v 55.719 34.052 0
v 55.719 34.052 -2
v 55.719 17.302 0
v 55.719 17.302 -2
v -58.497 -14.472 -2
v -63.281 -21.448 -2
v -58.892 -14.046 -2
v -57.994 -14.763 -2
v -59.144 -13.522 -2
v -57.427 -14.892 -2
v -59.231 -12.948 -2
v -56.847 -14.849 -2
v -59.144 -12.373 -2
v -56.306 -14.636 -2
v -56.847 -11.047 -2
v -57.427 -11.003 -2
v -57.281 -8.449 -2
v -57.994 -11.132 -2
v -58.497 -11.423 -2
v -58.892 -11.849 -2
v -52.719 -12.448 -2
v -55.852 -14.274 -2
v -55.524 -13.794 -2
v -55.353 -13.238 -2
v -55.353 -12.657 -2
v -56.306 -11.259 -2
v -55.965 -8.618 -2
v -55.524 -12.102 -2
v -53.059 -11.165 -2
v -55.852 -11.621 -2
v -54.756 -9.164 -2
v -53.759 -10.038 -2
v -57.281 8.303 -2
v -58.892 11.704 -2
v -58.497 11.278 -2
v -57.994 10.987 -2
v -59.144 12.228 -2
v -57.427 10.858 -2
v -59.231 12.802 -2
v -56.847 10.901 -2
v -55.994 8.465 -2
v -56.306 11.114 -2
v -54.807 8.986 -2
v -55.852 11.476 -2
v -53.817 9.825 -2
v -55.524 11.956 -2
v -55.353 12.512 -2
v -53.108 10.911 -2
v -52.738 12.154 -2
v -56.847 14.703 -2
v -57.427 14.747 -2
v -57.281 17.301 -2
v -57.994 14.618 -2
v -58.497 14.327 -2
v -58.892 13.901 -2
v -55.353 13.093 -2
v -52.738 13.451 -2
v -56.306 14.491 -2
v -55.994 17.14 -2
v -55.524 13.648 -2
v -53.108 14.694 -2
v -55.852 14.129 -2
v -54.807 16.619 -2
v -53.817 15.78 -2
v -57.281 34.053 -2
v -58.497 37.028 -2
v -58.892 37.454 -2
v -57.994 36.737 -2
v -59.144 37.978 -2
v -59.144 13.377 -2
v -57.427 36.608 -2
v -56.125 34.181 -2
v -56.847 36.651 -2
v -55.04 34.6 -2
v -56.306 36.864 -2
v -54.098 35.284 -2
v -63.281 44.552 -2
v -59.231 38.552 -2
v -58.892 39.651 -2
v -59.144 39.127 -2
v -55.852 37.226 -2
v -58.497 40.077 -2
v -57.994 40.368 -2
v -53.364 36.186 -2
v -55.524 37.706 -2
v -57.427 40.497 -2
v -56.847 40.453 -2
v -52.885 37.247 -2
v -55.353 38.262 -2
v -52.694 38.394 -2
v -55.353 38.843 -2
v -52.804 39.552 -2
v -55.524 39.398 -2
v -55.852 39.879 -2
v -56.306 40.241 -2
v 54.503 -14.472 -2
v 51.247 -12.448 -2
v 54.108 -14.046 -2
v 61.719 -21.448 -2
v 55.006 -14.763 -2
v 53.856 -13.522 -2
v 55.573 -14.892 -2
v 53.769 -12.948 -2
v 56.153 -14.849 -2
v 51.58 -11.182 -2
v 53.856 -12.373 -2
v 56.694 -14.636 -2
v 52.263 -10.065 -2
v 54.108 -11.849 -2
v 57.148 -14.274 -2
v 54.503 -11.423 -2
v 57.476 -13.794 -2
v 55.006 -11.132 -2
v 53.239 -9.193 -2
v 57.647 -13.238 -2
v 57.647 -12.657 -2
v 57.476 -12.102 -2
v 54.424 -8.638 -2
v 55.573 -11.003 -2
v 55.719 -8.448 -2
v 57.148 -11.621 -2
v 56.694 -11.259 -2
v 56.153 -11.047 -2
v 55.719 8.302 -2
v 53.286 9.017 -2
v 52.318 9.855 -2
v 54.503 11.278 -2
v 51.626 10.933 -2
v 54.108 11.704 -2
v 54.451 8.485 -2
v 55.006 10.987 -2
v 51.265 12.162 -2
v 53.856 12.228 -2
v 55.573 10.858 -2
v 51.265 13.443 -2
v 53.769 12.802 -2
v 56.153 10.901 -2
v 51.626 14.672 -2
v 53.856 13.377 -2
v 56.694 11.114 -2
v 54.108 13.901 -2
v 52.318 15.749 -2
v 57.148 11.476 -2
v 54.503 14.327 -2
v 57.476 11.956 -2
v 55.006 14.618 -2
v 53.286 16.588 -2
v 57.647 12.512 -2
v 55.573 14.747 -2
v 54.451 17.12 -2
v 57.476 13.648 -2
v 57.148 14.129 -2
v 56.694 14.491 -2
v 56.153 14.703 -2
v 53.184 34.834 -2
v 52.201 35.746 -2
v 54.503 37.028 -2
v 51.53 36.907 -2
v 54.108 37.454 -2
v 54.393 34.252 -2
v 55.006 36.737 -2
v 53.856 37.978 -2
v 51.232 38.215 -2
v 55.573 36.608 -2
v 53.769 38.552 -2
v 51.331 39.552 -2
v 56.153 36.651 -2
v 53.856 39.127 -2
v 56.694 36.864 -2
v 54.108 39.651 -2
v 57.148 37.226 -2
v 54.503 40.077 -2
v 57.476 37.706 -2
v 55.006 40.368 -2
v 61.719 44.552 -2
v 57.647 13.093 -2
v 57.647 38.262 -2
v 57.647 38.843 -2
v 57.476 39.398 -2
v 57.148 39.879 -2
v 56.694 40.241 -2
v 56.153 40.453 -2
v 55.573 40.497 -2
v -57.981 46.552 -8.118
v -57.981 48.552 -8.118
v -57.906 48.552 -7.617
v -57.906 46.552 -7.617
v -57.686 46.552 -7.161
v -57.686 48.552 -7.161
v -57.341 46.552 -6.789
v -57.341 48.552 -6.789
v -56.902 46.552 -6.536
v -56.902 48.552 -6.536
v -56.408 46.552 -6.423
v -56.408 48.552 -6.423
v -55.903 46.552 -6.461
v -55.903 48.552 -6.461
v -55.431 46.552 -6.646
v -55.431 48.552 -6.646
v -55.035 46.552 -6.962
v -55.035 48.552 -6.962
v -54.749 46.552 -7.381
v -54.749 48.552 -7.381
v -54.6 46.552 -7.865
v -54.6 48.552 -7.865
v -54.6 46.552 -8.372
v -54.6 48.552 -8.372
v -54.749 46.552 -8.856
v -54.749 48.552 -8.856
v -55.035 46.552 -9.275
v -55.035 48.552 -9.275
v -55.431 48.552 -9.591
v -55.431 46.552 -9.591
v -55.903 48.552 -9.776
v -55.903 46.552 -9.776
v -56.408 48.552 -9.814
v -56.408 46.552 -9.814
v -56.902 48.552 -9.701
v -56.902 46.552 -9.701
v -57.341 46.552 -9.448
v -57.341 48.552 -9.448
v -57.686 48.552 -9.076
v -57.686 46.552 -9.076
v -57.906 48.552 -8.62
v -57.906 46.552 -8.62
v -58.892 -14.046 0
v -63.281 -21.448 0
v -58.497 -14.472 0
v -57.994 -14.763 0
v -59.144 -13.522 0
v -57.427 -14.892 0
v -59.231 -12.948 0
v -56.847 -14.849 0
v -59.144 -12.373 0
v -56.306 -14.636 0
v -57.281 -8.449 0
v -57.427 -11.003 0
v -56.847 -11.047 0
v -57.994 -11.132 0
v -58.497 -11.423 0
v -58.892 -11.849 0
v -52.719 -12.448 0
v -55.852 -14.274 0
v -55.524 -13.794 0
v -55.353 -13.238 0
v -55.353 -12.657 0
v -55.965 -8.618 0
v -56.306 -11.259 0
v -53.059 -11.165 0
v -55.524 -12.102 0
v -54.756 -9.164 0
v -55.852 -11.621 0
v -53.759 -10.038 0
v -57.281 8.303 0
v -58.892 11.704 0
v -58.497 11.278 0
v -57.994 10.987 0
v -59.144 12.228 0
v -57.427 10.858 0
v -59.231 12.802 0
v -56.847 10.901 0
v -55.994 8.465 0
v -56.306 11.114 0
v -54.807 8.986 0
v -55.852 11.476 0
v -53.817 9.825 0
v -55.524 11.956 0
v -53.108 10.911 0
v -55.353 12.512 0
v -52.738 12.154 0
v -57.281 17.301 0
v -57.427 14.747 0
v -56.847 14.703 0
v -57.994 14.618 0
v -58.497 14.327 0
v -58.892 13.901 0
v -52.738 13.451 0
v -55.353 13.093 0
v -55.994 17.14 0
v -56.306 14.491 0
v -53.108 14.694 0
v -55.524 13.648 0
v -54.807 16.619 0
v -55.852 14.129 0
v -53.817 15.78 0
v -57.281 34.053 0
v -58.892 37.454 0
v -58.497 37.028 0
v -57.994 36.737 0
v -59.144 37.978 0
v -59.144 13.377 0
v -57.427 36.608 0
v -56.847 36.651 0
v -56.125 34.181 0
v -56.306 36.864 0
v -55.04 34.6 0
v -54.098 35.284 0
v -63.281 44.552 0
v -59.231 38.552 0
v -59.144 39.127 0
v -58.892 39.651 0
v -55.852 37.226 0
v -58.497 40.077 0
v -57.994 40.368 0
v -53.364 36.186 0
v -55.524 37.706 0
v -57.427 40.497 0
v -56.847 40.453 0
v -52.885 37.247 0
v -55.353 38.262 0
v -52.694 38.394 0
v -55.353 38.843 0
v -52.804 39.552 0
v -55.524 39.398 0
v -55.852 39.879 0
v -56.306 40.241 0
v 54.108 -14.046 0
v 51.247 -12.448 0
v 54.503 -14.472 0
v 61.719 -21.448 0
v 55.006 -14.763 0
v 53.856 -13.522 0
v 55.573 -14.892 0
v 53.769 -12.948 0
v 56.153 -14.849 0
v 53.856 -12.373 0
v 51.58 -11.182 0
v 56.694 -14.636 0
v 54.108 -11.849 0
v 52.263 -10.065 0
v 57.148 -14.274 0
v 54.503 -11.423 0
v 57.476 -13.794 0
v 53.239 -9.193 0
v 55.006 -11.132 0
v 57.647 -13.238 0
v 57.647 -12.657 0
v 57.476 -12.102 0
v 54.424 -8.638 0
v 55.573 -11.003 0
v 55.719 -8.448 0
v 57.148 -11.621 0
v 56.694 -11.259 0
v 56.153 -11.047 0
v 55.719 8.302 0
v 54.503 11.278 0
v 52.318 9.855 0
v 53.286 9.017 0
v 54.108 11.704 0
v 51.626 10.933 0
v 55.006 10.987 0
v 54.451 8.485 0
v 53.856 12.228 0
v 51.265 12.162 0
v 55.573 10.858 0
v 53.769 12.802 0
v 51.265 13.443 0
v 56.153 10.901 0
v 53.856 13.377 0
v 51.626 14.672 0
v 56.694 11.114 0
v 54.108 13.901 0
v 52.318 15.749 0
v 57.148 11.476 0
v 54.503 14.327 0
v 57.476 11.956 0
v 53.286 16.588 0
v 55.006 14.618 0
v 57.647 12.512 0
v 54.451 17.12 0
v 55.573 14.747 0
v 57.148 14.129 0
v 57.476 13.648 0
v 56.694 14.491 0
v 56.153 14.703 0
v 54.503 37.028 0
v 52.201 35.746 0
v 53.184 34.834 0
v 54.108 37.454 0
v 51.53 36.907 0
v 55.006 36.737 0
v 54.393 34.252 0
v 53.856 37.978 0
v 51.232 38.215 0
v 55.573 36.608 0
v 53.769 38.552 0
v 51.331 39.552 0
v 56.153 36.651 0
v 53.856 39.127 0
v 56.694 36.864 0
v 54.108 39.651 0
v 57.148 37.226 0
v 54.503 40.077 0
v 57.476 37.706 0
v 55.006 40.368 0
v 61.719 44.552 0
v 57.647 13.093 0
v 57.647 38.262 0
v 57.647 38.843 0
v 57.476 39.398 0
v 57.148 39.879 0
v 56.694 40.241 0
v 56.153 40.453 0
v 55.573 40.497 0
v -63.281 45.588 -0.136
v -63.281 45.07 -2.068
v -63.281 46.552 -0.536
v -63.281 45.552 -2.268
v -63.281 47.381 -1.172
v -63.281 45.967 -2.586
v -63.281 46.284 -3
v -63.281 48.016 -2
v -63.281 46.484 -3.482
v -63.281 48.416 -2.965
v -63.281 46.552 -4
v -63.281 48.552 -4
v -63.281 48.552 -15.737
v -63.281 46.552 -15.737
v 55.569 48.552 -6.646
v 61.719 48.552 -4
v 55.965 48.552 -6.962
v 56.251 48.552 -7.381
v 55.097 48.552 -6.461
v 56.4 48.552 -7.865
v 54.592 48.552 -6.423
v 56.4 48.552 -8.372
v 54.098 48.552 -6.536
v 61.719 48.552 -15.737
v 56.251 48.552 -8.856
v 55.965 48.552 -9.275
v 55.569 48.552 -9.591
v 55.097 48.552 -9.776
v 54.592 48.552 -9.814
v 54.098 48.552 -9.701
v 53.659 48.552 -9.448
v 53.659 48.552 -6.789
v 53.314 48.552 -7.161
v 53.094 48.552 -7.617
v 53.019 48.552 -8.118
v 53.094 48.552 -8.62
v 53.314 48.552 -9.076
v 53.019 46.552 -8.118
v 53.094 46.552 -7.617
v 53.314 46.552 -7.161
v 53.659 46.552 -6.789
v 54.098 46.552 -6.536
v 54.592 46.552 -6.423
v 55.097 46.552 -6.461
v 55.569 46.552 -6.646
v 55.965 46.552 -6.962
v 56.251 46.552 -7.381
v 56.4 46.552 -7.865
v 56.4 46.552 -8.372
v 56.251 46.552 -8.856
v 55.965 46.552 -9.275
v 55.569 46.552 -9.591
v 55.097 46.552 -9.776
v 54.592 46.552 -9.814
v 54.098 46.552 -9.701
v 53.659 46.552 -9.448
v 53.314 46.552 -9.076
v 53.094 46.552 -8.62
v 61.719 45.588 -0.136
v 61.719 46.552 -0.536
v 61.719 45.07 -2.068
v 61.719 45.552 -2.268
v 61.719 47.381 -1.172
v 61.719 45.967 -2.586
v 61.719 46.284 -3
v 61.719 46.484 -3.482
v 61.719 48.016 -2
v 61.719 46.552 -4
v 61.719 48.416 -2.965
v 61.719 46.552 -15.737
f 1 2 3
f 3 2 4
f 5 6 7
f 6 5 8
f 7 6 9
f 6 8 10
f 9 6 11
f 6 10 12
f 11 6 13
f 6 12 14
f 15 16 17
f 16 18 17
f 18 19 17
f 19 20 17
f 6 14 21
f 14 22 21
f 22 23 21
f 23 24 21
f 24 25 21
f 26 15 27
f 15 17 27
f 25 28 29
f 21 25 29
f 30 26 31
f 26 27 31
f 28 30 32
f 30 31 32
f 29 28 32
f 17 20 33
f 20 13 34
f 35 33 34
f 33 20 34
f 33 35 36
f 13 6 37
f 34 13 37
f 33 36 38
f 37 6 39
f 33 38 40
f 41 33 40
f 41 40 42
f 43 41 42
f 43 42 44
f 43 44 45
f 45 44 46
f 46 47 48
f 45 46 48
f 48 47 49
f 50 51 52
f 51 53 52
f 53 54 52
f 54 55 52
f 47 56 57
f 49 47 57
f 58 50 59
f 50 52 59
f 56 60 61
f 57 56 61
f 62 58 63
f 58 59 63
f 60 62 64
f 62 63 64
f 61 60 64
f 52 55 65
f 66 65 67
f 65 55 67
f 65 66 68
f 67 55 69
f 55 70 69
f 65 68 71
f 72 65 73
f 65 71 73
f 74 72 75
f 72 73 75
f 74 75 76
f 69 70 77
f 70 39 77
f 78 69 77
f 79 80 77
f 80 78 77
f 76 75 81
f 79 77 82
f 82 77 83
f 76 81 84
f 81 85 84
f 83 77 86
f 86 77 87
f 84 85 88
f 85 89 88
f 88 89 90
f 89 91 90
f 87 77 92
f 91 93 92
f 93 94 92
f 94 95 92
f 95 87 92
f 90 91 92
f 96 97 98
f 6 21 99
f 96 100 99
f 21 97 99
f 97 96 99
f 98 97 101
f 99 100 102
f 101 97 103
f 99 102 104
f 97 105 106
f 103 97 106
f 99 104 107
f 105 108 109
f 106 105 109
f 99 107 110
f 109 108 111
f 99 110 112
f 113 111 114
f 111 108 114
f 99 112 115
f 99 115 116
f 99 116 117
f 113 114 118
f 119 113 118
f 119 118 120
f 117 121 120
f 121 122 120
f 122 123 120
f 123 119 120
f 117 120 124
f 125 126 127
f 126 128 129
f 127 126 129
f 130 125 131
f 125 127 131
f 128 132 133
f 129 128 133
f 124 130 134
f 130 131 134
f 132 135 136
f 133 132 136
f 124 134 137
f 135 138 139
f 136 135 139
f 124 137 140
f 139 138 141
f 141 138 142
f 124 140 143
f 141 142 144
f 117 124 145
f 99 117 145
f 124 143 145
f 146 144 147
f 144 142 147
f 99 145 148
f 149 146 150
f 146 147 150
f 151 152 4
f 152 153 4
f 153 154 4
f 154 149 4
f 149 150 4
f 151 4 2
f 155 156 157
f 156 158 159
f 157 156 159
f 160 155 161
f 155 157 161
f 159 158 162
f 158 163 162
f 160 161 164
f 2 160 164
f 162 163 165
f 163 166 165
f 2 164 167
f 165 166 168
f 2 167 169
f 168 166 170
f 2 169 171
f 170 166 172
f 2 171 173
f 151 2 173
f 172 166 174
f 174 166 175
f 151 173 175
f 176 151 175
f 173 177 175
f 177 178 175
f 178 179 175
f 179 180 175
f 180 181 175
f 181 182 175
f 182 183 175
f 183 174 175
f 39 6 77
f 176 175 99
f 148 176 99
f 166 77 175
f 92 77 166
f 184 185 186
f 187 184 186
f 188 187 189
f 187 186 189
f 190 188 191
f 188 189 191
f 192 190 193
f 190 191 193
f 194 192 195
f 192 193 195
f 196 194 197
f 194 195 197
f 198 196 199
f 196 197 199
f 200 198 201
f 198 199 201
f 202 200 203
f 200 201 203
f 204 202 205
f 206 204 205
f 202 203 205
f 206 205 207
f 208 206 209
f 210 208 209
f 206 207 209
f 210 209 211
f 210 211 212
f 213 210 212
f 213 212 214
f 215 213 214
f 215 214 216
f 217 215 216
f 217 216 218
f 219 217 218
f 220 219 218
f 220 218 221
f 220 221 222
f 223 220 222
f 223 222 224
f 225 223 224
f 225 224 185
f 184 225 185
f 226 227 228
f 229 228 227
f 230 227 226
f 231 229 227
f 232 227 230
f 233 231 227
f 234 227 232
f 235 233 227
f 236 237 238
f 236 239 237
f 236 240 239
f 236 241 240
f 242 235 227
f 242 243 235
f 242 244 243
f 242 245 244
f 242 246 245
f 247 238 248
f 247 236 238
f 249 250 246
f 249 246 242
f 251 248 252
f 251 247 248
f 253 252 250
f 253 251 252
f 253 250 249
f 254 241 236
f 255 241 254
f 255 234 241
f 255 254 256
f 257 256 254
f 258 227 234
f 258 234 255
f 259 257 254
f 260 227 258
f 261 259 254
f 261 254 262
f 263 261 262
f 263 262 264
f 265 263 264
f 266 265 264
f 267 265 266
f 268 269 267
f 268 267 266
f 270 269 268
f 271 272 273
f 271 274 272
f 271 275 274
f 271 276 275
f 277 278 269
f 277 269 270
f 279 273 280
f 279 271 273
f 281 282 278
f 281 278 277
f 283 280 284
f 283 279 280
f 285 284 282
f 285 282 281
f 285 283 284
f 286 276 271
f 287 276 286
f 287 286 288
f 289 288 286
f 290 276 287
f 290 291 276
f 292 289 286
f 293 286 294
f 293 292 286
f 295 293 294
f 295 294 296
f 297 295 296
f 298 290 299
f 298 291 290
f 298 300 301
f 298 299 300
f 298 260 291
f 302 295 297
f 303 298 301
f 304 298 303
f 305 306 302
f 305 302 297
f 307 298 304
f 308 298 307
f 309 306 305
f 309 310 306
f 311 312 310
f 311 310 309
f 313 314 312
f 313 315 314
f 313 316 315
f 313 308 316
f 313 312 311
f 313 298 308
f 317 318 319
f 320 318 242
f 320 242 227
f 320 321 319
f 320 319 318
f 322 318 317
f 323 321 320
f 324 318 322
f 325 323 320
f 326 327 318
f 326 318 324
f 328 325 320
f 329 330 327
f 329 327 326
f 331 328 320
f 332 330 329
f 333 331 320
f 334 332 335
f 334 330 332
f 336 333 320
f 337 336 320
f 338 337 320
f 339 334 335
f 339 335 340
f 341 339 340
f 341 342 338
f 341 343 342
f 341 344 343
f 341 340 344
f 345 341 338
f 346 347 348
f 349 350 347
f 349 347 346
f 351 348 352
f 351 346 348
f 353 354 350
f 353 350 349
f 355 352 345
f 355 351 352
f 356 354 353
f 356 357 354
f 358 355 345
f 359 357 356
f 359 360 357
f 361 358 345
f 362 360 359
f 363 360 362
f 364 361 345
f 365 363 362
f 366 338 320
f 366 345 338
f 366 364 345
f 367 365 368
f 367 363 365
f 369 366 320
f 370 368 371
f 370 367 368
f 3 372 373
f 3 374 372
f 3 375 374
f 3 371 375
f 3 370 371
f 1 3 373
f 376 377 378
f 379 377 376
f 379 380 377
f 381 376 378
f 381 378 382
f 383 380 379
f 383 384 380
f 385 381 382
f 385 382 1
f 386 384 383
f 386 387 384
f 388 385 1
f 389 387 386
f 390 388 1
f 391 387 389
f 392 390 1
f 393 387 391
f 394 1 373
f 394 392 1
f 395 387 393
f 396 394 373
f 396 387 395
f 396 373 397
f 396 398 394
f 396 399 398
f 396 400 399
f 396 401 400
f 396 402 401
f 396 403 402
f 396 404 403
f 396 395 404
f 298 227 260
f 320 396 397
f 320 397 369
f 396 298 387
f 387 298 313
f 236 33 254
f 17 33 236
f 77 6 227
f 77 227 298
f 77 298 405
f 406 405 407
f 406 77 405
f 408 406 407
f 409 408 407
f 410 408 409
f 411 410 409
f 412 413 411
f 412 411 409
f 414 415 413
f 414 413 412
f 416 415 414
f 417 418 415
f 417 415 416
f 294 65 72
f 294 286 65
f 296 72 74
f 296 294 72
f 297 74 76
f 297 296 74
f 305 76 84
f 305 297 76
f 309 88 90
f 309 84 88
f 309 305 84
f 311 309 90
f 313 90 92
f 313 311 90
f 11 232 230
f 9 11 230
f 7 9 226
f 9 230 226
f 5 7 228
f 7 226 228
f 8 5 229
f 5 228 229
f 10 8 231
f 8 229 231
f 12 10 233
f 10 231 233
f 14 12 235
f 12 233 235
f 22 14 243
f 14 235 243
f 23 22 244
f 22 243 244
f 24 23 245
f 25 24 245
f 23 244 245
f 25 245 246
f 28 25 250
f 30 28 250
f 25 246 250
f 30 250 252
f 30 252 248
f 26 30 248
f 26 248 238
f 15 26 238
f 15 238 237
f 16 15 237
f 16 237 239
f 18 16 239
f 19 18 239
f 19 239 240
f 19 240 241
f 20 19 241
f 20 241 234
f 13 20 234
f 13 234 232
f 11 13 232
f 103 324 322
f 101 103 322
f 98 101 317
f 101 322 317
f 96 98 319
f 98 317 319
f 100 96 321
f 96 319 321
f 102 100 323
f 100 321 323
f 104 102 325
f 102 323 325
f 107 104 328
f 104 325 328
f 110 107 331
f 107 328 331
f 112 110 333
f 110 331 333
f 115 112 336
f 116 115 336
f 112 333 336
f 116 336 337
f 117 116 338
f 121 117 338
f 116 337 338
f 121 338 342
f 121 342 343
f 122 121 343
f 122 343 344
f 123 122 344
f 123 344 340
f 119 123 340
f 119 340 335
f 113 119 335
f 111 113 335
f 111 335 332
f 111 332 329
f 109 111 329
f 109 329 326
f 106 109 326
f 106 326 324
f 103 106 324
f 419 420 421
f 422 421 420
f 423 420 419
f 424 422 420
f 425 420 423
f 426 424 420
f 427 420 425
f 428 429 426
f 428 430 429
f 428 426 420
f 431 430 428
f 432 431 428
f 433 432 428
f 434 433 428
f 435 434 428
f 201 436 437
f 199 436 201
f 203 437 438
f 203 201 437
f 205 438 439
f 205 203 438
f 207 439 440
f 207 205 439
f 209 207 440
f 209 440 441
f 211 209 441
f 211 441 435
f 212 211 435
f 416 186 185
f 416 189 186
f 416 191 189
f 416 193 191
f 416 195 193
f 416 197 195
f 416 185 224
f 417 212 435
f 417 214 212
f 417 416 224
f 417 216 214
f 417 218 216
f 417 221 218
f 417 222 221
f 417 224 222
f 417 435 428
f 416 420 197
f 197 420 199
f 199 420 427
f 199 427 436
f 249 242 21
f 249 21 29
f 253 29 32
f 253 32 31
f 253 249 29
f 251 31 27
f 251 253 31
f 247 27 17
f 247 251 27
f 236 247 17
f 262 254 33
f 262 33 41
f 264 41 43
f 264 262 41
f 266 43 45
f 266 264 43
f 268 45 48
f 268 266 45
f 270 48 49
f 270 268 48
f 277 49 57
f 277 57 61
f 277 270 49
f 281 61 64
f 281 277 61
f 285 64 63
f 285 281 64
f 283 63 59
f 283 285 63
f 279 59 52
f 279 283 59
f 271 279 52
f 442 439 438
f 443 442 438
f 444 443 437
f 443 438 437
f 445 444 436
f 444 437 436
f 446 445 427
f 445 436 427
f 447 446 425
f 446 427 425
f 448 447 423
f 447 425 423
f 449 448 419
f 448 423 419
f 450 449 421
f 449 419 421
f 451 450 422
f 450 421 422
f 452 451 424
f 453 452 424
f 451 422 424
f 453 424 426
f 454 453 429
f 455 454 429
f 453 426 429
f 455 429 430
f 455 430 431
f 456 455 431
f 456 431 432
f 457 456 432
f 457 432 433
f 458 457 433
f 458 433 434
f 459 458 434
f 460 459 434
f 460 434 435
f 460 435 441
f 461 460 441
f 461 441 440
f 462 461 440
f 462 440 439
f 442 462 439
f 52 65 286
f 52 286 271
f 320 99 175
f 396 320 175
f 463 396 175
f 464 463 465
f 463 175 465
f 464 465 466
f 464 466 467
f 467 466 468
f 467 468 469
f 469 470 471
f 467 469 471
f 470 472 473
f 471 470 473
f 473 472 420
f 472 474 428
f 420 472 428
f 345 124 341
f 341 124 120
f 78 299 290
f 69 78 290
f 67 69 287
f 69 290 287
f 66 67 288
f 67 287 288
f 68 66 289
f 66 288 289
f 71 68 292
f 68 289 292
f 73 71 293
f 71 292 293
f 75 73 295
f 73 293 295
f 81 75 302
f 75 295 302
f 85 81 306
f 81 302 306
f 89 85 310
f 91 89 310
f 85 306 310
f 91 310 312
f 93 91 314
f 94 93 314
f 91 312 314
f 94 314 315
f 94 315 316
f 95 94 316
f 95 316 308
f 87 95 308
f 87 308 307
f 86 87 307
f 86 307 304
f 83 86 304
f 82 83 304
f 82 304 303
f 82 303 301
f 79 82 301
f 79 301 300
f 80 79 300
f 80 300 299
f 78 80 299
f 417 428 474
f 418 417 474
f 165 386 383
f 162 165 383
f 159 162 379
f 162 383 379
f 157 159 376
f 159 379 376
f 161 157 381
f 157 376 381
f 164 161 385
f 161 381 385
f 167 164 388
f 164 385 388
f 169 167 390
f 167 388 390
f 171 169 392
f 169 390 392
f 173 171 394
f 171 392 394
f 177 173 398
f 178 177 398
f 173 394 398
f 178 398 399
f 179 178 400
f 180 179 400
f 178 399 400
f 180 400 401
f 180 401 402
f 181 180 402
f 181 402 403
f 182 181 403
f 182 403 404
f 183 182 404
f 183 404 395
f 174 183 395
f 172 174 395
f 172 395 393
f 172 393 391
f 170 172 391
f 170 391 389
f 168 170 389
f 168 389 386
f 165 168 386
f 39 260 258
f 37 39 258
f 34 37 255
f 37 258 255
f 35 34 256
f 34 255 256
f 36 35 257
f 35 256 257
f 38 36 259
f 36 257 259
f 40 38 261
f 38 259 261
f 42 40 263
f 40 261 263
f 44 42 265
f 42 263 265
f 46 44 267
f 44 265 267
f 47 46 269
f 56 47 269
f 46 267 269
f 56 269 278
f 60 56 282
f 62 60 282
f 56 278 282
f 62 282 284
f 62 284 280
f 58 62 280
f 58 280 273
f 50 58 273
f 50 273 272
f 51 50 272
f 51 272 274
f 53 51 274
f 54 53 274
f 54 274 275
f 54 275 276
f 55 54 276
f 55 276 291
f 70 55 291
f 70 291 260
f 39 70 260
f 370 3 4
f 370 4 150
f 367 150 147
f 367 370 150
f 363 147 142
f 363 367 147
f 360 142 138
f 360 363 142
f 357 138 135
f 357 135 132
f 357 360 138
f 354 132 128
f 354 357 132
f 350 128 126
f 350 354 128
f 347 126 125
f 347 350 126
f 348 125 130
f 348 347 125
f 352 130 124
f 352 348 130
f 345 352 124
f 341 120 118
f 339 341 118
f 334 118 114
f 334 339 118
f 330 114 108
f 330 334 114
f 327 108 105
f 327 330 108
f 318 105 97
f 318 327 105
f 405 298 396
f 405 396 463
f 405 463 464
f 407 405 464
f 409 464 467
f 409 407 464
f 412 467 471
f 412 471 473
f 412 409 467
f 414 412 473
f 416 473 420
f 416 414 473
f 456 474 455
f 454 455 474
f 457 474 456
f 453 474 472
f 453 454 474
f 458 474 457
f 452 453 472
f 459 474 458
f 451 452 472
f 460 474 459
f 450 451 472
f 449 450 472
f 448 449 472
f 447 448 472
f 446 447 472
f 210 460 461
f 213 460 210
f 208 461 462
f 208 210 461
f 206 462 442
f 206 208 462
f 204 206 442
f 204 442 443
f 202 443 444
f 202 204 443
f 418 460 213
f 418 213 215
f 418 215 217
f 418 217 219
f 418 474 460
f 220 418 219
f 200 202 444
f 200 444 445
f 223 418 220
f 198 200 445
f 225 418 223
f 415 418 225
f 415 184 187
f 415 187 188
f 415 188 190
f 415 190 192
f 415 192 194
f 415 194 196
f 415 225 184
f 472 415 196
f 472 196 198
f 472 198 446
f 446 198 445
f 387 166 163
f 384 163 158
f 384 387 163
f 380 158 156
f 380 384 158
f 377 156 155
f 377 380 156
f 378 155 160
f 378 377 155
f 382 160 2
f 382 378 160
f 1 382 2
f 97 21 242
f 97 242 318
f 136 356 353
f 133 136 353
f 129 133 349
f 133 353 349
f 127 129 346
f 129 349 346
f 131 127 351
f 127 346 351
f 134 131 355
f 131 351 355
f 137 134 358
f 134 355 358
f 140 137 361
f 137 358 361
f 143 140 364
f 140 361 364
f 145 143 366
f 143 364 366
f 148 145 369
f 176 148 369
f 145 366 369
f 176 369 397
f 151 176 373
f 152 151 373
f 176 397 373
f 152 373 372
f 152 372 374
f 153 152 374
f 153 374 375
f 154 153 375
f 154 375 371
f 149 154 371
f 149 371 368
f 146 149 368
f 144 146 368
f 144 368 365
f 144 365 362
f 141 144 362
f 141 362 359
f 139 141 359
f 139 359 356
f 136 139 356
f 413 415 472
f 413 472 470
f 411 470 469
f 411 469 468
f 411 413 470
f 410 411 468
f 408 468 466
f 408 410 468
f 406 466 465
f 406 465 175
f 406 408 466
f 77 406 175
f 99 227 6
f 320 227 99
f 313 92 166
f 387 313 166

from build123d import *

# Parameters (mm, degrees)
SKETCH3_W                    = 125
SKETCH3_H                    = 70
BASE_FLANGE1_DEPTH           = 2
EDGE_FLANGE2_STRIP_W         = 12
EDGE_FLANGE2_STRIP_H         = 2
EDGE_FLANGE2_STRIP_CUT_DEPTH = 125
EDGE_FLANGE2_DEPTH           = 125
SKETCH18_W                   = 113
SKETCH18_H                   = 52
CUT_EXTRUDE3_DEPTH           = 10
SKETCH23_R                   = 4.5
BOSS_EXTRUDE1_DEPTH          = 2
PSU_BRACKET_MB_HOLES_D       = 3.4
M3_5_CLEARANCE_HOLE1_D       = 3.9


# Sheet-metal steps are written as plain solids
with BuildPart() as part:
    # Sketch3 → Base-Flange1 (new body)
    with BuildSketch(Plane.XY):
        with Locations((-0.781098762, 13.552360409)):
            Rectangle(SKETCH3_W, SKETCH3_H)
    extrude(amount=-BASE_FLANGE1_DEPTH)

    # Edge-Flange2 strip (across the edge) → Edge-Flange2 strip cut (cut)
    with BuildSketch(Plane(origin=(-63.281098762, 48.552360409, -2), x_dir=(0, -1, 0), z_dir=(1, 0, 0))):
        with Locations((-2, -1)):
            Rectangle(EDGE_FLANGE2_STRIP_W, EDGE_FLANGE2_STRIP_H)
    extrude(amount=EDGE_FLANGE2_STRIP_CUT_DEPTH, mode=Mode.SUBTRACT)

    # Edge-Flange2 section (across the edge) → Edge-Flange2 (add)
    with BuildSketch(Plane(origin=(-63.281098762, 48.552360409, -2), x_dir=(0, -1, 0), z_dir=(1, 0, 0))):
        with BuildLine():
            Line((0, 2), (0, 13.7366))
            Line((0, 13.7366), (2, 13.7366))
            Line((2, 13.7366), (2, 2))
            ThreePointArc((2, 2), (2.585786438, 0.585786438), (4, 0))
            Line((4, 0), (4, -2))
            ThreePointArc((4, -2), (1.171572875, -0.828427125), (0, 2))
        make_face()
    extrude(amount=EDGE_FLANGE2_DEPTH)

    # Sketch18 → Cut-Extrude3 (cut)
    with BuildSketch(Plane(origin=(-99.752621101, 247.510324645, -2), x_dir=(1, 0, 0), z_dir=(0, 0, -1))):
        with Locations((98.971522339, 233.957964235)):
            Rectangle(SKETCH18_W, SKETCH18_H)
    extrude(amount=-CUT_EXTRUDE3_DEPTH, mode=Mode.SUBTRACT)

    # Sketch23 → Boss-Extrude1 (add)
    with BuildSketch(Plane.XY):
        with Locations((-57.191455267, 12.802360409)):
            Circle(SKETCH23_R)
        with Locations((-57.191455267, -12.947639591)):
            Circle(SKETCH23_R)
        with Locations((55.718901238, -12.947639591)):
            Circle(SKETCH23_R)
        with Locations((55.718901238, 12.802360409)):
            Circle(SKETCH23_R)
        with Locations((-57.191455267, 38.552360409)):
            Circle(SKETCH23_R)
        with Locations((55.718901238, 38.552360409)):
            Circle(SKETCH23_R)
    extrude(amount=-BOSS_EXTRUDE1_DEPTH)

    # PSU bracket MB holes (through all)
    with Locations(Plane(origin=(-99.752621101, 40.552360409, 598.492474399), x_dir=(1, 0, 0), z_dir=(0, -1, 0))):
        with Locations((43.471522339, -606.610908499), (154.471522339, -606.610908499)):
            Hole(PSU_BRACKET_MB_HOLES_D / 2)

    # M3.5 Clearance Hole1 (through all)
    with Locations(Plane(origin=(-98.752621101, 247.510324645, -2), x_dir=(1, 0, 0), z_dir=(0, 0, -1))):
        with Locations((41.471522339, 260.457964235), (41.471522339, 234.707964235), (41.471522339, 208.957964235), (154.471522339, 208.957964235), (154.471522339, 234.707964235), (154.471522339, 260.457964235)):
            Hole(M3_5_CLEARANCE_HOLE1_D / 2)


solid = part.part
